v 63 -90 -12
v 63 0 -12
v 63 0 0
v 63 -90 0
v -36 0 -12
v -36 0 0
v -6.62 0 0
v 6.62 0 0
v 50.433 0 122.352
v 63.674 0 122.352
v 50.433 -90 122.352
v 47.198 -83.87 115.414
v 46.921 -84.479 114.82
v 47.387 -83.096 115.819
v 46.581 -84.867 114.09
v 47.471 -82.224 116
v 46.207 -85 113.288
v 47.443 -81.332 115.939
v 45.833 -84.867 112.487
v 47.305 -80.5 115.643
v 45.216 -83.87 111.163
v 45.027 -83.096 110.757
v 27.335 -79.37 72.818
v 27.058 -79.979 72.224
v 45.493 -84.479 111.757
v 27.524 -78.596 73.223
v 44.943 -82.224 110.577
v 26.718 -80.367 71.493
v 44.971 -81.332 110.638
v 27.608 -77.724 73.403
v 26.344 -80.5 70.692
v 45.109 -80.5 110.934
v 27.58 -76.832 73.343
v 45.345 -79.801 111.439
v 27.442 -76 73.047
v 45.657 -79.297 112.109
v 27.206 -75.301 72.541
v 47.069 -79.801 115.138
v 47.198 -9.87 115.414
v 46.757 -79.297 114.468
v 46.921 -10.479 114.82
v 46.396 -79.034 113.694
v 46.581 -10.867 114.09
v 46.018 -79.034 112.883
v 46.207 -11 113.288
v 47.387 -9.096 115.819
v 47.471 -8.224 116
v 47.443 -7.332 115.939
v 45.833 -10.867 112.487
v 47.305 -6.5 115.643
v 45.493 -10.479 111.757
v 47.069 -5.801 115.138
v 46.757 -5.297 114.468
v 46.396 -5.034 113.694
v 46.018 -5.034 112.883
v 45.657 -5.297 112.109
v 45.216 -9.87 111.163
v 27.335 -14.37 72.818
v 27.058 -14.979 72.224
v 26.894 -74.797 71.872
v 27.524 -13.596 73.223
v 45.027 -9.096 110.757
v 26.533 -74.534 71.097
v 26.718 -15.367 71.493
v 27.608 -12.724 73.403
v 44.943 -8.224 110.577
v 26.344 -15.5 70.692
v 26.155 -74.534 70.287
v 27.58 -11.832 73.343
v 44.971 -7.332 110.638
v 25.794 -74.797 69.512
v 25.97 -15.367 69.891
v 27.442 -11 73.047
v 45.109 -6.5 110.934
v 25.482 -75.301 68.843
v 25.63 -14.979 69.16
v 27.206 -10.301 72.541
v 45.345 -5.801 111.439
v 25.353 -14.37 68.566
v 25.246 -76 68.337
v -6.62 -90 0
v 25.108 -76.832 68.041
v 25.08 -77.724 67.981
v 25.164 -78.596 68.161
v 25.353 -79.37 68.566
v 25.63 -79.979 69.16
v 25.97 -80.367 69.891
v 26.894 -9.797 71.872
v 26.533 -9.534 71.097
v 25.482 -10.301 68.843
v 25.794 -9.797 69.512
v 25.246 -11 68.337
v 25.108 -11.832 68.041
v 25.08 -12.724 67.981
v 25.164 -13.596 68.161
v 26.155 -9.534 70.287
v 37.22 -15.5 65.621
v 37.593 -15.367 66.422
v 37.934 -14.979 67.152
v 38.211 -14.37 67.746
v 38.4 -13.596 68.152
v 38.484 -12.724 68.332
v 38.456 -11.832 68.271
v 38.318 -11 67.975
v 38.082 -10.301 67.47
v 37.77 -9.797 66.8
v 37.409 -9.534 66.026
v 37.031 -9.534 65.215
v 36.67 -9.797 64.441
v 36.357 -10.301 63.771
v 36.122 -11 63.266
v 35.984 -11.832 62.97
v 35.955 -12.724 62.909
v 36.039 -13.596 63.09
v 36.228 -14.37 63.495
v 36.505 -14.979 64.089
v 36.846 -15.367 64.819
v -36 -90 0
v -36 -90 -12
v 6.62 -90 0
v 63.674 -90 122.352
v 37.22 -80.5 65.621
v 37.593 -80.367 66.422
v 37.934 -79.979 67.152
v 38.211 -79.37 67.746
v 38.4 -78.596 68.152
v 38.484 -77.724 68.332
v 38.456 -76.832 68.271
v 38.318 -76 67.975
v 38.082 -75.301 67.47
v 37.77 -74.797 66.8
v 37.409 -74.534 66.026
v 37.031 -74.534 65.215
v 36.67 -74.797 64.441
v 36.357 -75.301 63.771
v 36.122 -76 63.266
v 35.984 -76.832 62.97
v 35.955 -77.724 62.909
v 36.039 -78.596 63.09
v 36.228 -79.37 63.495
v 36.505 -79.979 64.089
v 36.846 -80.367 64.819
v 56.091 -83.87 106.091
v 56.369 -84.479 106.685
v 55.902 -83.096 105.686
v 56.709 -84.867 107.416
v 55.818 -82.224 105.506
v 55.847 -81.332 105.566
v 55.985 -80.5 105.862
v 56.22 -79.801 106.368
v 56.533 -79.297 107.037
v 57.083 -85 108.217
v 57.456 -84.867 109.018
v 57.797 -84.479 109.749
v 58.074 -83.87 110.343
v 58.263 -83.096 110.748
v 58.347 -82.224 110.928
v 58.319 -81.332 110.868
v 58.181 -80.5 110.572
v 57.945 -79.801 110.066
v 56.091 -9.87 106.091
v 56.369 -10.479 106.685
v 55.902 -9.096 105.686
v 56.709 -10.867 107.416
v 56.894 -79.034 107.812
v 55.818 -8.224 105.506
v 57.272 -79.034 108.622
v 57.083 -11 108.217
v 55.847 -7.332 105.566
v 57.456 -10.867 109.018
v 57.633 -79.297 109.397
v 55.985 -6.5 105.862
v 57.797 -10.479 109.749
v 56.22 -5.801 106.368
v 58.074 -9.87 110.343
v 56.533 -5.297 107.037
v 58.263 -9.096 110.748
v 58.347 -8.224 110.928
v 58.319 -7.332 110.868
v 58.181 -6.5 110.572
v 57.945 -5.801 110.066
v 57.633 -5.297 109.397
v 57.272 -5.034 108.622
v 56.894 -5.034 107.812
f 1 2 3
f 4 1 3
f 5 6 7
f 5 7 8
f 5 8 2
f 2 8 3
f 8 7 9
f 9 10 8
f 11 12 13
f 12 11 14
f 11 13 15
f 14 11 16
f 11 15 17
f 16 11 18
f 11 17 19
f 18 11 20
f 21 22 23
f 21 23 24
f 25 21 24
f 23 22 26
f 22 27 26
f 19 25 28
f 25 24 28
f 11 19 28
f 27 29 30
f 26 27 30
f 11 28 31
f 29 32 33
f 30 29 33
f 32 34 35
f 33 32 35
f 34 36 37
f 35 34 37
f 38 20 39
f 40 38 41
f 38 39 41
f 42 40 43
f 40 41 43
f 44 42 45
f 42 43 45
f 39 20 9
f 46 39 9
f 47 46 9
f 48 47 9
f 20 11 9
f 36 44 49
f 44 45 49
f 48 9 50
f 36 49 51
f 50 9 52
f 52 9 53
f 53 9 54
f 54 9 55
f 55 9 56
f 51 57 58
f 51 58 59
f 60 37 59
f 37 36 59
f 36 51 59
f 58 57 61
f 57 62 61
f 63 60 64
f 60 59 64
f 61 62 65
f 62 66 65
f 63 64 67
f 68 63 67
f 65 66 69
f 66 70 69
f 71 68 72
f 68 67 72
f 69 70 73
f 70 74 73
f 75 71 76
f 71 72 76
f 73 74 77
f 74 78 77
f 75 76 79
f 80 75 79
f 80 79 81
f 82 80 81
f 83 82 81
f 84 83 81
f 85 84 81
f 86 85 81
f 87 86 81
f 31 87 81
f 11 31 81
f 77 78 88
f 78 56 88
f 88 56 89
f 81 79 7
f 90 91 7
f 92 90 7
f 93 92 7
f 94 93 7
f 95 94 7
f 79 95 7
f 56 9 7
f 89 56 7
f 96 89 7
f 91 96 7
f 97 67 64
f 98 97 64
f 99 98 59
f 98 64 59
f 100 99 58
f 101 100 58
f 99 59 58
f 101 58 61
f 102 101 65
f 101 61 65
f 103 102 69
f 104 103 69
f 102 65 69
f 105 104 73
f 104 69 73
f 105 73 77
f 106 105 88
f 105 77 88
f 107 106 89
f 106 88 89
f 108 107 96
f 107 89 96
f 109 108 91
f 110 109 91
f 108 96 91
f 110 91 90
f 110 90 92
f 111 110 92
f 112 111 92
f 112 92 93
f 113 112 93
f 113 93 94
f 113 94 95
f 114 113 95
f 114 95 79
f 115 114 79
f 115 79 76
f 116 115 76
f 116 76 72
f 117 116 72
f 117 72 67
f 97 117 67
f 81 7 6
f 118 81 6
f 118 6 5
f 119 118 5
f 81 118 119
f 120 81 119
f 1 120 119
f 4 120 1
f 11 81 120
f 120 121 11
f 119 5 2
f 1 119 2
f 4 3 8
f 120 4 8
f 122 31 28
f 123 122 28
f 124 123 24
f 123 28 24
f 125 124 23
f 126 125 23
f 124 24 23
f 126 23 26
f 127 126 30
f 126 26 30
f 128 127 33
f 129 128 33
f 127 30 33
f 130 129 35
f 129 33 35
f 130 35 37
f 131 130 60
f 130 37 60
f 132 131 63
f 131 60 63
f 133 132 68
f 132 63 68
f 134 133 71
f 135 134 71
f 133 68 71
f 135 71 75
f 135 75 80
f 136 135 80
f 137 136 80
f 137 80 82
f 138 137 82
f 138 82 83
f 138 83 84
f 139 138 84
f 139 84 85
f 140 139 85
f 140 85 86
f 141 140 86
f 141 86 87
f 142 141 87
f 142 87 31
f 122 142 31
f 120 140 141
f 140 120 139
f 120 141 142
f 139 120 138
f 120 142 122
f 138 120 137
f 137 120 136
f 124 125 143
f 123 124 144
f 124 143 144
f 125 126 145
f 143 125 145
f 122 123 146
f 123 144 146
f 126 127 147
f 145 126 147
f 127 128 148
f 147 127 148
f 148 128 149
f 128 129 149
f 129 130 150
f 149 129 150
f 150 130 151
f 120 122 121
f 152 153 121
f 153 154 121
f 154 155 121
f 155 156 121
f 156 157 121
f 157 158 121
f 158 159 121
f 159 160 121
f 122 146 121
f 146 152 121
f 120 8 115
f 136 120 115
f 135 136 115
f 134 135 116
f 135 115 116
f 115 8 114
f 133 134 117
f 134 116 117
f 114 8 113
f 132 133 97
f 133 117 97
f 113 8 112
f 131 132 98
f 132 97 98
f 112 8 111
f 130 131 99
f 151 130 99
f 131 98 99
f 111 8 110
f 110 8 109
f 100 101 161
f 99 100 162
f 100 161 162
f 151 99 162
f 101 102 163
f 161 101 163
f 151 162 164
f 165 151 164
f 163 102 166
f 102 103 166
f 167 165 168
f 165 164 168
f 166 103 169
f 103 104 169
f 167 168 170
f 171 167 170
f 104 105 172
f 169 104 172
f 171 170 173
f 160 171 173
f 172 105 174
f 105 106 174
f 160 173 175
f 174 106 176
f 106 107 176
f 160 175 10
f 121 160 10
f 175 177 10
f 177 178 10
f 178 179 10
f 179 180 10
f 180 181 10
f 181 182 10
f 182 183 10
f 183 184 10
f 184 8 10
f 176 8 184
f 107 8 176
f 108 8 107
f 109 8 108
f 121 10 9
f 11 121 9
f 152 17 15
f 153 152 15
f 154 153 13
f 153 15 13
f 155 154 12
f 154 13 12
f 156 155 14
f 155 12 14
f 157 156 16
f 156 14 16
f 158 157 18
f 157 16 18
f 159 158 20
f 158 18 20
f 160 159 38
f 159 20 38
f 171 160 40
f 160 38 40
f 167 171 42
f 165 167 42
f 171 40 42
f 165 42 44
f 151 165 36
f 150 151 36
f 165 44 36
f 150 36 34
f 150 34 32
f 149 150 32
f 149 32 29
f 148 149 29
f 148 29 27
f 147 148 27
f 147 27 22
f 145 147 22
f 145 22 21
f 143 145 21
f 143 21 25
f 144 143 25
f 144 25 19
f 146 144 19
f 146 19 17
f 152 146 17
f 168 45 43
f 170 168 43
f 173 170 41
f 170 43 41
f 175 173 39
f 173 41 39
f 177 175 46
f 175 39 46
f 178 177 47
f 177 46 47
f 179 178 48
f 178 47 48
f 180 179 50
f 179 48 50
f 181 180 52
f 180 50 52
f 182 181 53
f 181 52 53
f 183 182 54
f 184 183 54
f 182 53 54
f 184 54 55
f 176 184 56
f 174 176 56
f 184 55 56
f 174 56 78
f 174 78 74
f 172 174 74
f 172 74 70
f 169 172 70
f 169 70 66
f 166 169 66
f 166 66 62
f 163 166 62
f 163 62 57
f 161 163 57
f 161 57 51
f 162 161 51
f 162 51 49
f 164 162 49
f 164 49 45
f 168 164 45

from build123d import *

# Parameters (mm, degrees)
F1_DEPTH = 90
F2_R     = 3
F3_DEPTH = 68.7804190514
F4_R     = 3
F5_DEPTH = 68.7804190514


with BuildPart() as f1:
    # F0 (on Front) → F1 (new body)
    with BuildSketch(Plane.XZ):
        Polygon((-6.6202675138, 0), (0, 0), (57.053465335, 122.3515512499), (50.4331978212, 122.3515512499), align=None)
        Polygon((57.053465335, 122.3515512499), (0, 0), (6.6202675138, 0), (63.6737328488, 122.3515512499), align=None)
        Polygon((6.6202675138, 0), (0, 0), (0, -12), (63, -12), (63, 0), align=None)
        Polygon((0, -12), (0, 0), (-6.6202675138, 0), (-36, 0), (-36, -12), align=None)
    extrude(amount=F1_DEPTH)

    # F2 (on face) → F3 (cut, through all)
    with BuildSketch(Plane(origin=(-5.4378467222, 0, 2.5357095704), x_dir=(0, -1, 0), z_dir=(-0.906307787, 0, 0.4226182617))):
        with Locations((8, 122.2021540511)):
            Circle(F2_R)
        with Locations((82, 122.2021540511)):
            Circle(F2_R)
    extrude(amount=-F3_DEPTH, mode=Mode.SUBTRACT)

    # F4 (on face) → F5 (cut, through all)
    with BuildSketch(Plane(origin=(-5.4378467222, 0, 2.5357095704), x_dir=(0, -1, 0), z_dir=(-0.906307787, 0, 0.4226182617))):
        with Locations((12.5, 75.2021540511)):
            Circle(F4_R)
        with Locations((77.5, 75.2021540511)):
            Circle(F4_R)
    extrude(amount=-F5_DEPTH, mode=Mode.SUBTRACT)


solid = f1.part
